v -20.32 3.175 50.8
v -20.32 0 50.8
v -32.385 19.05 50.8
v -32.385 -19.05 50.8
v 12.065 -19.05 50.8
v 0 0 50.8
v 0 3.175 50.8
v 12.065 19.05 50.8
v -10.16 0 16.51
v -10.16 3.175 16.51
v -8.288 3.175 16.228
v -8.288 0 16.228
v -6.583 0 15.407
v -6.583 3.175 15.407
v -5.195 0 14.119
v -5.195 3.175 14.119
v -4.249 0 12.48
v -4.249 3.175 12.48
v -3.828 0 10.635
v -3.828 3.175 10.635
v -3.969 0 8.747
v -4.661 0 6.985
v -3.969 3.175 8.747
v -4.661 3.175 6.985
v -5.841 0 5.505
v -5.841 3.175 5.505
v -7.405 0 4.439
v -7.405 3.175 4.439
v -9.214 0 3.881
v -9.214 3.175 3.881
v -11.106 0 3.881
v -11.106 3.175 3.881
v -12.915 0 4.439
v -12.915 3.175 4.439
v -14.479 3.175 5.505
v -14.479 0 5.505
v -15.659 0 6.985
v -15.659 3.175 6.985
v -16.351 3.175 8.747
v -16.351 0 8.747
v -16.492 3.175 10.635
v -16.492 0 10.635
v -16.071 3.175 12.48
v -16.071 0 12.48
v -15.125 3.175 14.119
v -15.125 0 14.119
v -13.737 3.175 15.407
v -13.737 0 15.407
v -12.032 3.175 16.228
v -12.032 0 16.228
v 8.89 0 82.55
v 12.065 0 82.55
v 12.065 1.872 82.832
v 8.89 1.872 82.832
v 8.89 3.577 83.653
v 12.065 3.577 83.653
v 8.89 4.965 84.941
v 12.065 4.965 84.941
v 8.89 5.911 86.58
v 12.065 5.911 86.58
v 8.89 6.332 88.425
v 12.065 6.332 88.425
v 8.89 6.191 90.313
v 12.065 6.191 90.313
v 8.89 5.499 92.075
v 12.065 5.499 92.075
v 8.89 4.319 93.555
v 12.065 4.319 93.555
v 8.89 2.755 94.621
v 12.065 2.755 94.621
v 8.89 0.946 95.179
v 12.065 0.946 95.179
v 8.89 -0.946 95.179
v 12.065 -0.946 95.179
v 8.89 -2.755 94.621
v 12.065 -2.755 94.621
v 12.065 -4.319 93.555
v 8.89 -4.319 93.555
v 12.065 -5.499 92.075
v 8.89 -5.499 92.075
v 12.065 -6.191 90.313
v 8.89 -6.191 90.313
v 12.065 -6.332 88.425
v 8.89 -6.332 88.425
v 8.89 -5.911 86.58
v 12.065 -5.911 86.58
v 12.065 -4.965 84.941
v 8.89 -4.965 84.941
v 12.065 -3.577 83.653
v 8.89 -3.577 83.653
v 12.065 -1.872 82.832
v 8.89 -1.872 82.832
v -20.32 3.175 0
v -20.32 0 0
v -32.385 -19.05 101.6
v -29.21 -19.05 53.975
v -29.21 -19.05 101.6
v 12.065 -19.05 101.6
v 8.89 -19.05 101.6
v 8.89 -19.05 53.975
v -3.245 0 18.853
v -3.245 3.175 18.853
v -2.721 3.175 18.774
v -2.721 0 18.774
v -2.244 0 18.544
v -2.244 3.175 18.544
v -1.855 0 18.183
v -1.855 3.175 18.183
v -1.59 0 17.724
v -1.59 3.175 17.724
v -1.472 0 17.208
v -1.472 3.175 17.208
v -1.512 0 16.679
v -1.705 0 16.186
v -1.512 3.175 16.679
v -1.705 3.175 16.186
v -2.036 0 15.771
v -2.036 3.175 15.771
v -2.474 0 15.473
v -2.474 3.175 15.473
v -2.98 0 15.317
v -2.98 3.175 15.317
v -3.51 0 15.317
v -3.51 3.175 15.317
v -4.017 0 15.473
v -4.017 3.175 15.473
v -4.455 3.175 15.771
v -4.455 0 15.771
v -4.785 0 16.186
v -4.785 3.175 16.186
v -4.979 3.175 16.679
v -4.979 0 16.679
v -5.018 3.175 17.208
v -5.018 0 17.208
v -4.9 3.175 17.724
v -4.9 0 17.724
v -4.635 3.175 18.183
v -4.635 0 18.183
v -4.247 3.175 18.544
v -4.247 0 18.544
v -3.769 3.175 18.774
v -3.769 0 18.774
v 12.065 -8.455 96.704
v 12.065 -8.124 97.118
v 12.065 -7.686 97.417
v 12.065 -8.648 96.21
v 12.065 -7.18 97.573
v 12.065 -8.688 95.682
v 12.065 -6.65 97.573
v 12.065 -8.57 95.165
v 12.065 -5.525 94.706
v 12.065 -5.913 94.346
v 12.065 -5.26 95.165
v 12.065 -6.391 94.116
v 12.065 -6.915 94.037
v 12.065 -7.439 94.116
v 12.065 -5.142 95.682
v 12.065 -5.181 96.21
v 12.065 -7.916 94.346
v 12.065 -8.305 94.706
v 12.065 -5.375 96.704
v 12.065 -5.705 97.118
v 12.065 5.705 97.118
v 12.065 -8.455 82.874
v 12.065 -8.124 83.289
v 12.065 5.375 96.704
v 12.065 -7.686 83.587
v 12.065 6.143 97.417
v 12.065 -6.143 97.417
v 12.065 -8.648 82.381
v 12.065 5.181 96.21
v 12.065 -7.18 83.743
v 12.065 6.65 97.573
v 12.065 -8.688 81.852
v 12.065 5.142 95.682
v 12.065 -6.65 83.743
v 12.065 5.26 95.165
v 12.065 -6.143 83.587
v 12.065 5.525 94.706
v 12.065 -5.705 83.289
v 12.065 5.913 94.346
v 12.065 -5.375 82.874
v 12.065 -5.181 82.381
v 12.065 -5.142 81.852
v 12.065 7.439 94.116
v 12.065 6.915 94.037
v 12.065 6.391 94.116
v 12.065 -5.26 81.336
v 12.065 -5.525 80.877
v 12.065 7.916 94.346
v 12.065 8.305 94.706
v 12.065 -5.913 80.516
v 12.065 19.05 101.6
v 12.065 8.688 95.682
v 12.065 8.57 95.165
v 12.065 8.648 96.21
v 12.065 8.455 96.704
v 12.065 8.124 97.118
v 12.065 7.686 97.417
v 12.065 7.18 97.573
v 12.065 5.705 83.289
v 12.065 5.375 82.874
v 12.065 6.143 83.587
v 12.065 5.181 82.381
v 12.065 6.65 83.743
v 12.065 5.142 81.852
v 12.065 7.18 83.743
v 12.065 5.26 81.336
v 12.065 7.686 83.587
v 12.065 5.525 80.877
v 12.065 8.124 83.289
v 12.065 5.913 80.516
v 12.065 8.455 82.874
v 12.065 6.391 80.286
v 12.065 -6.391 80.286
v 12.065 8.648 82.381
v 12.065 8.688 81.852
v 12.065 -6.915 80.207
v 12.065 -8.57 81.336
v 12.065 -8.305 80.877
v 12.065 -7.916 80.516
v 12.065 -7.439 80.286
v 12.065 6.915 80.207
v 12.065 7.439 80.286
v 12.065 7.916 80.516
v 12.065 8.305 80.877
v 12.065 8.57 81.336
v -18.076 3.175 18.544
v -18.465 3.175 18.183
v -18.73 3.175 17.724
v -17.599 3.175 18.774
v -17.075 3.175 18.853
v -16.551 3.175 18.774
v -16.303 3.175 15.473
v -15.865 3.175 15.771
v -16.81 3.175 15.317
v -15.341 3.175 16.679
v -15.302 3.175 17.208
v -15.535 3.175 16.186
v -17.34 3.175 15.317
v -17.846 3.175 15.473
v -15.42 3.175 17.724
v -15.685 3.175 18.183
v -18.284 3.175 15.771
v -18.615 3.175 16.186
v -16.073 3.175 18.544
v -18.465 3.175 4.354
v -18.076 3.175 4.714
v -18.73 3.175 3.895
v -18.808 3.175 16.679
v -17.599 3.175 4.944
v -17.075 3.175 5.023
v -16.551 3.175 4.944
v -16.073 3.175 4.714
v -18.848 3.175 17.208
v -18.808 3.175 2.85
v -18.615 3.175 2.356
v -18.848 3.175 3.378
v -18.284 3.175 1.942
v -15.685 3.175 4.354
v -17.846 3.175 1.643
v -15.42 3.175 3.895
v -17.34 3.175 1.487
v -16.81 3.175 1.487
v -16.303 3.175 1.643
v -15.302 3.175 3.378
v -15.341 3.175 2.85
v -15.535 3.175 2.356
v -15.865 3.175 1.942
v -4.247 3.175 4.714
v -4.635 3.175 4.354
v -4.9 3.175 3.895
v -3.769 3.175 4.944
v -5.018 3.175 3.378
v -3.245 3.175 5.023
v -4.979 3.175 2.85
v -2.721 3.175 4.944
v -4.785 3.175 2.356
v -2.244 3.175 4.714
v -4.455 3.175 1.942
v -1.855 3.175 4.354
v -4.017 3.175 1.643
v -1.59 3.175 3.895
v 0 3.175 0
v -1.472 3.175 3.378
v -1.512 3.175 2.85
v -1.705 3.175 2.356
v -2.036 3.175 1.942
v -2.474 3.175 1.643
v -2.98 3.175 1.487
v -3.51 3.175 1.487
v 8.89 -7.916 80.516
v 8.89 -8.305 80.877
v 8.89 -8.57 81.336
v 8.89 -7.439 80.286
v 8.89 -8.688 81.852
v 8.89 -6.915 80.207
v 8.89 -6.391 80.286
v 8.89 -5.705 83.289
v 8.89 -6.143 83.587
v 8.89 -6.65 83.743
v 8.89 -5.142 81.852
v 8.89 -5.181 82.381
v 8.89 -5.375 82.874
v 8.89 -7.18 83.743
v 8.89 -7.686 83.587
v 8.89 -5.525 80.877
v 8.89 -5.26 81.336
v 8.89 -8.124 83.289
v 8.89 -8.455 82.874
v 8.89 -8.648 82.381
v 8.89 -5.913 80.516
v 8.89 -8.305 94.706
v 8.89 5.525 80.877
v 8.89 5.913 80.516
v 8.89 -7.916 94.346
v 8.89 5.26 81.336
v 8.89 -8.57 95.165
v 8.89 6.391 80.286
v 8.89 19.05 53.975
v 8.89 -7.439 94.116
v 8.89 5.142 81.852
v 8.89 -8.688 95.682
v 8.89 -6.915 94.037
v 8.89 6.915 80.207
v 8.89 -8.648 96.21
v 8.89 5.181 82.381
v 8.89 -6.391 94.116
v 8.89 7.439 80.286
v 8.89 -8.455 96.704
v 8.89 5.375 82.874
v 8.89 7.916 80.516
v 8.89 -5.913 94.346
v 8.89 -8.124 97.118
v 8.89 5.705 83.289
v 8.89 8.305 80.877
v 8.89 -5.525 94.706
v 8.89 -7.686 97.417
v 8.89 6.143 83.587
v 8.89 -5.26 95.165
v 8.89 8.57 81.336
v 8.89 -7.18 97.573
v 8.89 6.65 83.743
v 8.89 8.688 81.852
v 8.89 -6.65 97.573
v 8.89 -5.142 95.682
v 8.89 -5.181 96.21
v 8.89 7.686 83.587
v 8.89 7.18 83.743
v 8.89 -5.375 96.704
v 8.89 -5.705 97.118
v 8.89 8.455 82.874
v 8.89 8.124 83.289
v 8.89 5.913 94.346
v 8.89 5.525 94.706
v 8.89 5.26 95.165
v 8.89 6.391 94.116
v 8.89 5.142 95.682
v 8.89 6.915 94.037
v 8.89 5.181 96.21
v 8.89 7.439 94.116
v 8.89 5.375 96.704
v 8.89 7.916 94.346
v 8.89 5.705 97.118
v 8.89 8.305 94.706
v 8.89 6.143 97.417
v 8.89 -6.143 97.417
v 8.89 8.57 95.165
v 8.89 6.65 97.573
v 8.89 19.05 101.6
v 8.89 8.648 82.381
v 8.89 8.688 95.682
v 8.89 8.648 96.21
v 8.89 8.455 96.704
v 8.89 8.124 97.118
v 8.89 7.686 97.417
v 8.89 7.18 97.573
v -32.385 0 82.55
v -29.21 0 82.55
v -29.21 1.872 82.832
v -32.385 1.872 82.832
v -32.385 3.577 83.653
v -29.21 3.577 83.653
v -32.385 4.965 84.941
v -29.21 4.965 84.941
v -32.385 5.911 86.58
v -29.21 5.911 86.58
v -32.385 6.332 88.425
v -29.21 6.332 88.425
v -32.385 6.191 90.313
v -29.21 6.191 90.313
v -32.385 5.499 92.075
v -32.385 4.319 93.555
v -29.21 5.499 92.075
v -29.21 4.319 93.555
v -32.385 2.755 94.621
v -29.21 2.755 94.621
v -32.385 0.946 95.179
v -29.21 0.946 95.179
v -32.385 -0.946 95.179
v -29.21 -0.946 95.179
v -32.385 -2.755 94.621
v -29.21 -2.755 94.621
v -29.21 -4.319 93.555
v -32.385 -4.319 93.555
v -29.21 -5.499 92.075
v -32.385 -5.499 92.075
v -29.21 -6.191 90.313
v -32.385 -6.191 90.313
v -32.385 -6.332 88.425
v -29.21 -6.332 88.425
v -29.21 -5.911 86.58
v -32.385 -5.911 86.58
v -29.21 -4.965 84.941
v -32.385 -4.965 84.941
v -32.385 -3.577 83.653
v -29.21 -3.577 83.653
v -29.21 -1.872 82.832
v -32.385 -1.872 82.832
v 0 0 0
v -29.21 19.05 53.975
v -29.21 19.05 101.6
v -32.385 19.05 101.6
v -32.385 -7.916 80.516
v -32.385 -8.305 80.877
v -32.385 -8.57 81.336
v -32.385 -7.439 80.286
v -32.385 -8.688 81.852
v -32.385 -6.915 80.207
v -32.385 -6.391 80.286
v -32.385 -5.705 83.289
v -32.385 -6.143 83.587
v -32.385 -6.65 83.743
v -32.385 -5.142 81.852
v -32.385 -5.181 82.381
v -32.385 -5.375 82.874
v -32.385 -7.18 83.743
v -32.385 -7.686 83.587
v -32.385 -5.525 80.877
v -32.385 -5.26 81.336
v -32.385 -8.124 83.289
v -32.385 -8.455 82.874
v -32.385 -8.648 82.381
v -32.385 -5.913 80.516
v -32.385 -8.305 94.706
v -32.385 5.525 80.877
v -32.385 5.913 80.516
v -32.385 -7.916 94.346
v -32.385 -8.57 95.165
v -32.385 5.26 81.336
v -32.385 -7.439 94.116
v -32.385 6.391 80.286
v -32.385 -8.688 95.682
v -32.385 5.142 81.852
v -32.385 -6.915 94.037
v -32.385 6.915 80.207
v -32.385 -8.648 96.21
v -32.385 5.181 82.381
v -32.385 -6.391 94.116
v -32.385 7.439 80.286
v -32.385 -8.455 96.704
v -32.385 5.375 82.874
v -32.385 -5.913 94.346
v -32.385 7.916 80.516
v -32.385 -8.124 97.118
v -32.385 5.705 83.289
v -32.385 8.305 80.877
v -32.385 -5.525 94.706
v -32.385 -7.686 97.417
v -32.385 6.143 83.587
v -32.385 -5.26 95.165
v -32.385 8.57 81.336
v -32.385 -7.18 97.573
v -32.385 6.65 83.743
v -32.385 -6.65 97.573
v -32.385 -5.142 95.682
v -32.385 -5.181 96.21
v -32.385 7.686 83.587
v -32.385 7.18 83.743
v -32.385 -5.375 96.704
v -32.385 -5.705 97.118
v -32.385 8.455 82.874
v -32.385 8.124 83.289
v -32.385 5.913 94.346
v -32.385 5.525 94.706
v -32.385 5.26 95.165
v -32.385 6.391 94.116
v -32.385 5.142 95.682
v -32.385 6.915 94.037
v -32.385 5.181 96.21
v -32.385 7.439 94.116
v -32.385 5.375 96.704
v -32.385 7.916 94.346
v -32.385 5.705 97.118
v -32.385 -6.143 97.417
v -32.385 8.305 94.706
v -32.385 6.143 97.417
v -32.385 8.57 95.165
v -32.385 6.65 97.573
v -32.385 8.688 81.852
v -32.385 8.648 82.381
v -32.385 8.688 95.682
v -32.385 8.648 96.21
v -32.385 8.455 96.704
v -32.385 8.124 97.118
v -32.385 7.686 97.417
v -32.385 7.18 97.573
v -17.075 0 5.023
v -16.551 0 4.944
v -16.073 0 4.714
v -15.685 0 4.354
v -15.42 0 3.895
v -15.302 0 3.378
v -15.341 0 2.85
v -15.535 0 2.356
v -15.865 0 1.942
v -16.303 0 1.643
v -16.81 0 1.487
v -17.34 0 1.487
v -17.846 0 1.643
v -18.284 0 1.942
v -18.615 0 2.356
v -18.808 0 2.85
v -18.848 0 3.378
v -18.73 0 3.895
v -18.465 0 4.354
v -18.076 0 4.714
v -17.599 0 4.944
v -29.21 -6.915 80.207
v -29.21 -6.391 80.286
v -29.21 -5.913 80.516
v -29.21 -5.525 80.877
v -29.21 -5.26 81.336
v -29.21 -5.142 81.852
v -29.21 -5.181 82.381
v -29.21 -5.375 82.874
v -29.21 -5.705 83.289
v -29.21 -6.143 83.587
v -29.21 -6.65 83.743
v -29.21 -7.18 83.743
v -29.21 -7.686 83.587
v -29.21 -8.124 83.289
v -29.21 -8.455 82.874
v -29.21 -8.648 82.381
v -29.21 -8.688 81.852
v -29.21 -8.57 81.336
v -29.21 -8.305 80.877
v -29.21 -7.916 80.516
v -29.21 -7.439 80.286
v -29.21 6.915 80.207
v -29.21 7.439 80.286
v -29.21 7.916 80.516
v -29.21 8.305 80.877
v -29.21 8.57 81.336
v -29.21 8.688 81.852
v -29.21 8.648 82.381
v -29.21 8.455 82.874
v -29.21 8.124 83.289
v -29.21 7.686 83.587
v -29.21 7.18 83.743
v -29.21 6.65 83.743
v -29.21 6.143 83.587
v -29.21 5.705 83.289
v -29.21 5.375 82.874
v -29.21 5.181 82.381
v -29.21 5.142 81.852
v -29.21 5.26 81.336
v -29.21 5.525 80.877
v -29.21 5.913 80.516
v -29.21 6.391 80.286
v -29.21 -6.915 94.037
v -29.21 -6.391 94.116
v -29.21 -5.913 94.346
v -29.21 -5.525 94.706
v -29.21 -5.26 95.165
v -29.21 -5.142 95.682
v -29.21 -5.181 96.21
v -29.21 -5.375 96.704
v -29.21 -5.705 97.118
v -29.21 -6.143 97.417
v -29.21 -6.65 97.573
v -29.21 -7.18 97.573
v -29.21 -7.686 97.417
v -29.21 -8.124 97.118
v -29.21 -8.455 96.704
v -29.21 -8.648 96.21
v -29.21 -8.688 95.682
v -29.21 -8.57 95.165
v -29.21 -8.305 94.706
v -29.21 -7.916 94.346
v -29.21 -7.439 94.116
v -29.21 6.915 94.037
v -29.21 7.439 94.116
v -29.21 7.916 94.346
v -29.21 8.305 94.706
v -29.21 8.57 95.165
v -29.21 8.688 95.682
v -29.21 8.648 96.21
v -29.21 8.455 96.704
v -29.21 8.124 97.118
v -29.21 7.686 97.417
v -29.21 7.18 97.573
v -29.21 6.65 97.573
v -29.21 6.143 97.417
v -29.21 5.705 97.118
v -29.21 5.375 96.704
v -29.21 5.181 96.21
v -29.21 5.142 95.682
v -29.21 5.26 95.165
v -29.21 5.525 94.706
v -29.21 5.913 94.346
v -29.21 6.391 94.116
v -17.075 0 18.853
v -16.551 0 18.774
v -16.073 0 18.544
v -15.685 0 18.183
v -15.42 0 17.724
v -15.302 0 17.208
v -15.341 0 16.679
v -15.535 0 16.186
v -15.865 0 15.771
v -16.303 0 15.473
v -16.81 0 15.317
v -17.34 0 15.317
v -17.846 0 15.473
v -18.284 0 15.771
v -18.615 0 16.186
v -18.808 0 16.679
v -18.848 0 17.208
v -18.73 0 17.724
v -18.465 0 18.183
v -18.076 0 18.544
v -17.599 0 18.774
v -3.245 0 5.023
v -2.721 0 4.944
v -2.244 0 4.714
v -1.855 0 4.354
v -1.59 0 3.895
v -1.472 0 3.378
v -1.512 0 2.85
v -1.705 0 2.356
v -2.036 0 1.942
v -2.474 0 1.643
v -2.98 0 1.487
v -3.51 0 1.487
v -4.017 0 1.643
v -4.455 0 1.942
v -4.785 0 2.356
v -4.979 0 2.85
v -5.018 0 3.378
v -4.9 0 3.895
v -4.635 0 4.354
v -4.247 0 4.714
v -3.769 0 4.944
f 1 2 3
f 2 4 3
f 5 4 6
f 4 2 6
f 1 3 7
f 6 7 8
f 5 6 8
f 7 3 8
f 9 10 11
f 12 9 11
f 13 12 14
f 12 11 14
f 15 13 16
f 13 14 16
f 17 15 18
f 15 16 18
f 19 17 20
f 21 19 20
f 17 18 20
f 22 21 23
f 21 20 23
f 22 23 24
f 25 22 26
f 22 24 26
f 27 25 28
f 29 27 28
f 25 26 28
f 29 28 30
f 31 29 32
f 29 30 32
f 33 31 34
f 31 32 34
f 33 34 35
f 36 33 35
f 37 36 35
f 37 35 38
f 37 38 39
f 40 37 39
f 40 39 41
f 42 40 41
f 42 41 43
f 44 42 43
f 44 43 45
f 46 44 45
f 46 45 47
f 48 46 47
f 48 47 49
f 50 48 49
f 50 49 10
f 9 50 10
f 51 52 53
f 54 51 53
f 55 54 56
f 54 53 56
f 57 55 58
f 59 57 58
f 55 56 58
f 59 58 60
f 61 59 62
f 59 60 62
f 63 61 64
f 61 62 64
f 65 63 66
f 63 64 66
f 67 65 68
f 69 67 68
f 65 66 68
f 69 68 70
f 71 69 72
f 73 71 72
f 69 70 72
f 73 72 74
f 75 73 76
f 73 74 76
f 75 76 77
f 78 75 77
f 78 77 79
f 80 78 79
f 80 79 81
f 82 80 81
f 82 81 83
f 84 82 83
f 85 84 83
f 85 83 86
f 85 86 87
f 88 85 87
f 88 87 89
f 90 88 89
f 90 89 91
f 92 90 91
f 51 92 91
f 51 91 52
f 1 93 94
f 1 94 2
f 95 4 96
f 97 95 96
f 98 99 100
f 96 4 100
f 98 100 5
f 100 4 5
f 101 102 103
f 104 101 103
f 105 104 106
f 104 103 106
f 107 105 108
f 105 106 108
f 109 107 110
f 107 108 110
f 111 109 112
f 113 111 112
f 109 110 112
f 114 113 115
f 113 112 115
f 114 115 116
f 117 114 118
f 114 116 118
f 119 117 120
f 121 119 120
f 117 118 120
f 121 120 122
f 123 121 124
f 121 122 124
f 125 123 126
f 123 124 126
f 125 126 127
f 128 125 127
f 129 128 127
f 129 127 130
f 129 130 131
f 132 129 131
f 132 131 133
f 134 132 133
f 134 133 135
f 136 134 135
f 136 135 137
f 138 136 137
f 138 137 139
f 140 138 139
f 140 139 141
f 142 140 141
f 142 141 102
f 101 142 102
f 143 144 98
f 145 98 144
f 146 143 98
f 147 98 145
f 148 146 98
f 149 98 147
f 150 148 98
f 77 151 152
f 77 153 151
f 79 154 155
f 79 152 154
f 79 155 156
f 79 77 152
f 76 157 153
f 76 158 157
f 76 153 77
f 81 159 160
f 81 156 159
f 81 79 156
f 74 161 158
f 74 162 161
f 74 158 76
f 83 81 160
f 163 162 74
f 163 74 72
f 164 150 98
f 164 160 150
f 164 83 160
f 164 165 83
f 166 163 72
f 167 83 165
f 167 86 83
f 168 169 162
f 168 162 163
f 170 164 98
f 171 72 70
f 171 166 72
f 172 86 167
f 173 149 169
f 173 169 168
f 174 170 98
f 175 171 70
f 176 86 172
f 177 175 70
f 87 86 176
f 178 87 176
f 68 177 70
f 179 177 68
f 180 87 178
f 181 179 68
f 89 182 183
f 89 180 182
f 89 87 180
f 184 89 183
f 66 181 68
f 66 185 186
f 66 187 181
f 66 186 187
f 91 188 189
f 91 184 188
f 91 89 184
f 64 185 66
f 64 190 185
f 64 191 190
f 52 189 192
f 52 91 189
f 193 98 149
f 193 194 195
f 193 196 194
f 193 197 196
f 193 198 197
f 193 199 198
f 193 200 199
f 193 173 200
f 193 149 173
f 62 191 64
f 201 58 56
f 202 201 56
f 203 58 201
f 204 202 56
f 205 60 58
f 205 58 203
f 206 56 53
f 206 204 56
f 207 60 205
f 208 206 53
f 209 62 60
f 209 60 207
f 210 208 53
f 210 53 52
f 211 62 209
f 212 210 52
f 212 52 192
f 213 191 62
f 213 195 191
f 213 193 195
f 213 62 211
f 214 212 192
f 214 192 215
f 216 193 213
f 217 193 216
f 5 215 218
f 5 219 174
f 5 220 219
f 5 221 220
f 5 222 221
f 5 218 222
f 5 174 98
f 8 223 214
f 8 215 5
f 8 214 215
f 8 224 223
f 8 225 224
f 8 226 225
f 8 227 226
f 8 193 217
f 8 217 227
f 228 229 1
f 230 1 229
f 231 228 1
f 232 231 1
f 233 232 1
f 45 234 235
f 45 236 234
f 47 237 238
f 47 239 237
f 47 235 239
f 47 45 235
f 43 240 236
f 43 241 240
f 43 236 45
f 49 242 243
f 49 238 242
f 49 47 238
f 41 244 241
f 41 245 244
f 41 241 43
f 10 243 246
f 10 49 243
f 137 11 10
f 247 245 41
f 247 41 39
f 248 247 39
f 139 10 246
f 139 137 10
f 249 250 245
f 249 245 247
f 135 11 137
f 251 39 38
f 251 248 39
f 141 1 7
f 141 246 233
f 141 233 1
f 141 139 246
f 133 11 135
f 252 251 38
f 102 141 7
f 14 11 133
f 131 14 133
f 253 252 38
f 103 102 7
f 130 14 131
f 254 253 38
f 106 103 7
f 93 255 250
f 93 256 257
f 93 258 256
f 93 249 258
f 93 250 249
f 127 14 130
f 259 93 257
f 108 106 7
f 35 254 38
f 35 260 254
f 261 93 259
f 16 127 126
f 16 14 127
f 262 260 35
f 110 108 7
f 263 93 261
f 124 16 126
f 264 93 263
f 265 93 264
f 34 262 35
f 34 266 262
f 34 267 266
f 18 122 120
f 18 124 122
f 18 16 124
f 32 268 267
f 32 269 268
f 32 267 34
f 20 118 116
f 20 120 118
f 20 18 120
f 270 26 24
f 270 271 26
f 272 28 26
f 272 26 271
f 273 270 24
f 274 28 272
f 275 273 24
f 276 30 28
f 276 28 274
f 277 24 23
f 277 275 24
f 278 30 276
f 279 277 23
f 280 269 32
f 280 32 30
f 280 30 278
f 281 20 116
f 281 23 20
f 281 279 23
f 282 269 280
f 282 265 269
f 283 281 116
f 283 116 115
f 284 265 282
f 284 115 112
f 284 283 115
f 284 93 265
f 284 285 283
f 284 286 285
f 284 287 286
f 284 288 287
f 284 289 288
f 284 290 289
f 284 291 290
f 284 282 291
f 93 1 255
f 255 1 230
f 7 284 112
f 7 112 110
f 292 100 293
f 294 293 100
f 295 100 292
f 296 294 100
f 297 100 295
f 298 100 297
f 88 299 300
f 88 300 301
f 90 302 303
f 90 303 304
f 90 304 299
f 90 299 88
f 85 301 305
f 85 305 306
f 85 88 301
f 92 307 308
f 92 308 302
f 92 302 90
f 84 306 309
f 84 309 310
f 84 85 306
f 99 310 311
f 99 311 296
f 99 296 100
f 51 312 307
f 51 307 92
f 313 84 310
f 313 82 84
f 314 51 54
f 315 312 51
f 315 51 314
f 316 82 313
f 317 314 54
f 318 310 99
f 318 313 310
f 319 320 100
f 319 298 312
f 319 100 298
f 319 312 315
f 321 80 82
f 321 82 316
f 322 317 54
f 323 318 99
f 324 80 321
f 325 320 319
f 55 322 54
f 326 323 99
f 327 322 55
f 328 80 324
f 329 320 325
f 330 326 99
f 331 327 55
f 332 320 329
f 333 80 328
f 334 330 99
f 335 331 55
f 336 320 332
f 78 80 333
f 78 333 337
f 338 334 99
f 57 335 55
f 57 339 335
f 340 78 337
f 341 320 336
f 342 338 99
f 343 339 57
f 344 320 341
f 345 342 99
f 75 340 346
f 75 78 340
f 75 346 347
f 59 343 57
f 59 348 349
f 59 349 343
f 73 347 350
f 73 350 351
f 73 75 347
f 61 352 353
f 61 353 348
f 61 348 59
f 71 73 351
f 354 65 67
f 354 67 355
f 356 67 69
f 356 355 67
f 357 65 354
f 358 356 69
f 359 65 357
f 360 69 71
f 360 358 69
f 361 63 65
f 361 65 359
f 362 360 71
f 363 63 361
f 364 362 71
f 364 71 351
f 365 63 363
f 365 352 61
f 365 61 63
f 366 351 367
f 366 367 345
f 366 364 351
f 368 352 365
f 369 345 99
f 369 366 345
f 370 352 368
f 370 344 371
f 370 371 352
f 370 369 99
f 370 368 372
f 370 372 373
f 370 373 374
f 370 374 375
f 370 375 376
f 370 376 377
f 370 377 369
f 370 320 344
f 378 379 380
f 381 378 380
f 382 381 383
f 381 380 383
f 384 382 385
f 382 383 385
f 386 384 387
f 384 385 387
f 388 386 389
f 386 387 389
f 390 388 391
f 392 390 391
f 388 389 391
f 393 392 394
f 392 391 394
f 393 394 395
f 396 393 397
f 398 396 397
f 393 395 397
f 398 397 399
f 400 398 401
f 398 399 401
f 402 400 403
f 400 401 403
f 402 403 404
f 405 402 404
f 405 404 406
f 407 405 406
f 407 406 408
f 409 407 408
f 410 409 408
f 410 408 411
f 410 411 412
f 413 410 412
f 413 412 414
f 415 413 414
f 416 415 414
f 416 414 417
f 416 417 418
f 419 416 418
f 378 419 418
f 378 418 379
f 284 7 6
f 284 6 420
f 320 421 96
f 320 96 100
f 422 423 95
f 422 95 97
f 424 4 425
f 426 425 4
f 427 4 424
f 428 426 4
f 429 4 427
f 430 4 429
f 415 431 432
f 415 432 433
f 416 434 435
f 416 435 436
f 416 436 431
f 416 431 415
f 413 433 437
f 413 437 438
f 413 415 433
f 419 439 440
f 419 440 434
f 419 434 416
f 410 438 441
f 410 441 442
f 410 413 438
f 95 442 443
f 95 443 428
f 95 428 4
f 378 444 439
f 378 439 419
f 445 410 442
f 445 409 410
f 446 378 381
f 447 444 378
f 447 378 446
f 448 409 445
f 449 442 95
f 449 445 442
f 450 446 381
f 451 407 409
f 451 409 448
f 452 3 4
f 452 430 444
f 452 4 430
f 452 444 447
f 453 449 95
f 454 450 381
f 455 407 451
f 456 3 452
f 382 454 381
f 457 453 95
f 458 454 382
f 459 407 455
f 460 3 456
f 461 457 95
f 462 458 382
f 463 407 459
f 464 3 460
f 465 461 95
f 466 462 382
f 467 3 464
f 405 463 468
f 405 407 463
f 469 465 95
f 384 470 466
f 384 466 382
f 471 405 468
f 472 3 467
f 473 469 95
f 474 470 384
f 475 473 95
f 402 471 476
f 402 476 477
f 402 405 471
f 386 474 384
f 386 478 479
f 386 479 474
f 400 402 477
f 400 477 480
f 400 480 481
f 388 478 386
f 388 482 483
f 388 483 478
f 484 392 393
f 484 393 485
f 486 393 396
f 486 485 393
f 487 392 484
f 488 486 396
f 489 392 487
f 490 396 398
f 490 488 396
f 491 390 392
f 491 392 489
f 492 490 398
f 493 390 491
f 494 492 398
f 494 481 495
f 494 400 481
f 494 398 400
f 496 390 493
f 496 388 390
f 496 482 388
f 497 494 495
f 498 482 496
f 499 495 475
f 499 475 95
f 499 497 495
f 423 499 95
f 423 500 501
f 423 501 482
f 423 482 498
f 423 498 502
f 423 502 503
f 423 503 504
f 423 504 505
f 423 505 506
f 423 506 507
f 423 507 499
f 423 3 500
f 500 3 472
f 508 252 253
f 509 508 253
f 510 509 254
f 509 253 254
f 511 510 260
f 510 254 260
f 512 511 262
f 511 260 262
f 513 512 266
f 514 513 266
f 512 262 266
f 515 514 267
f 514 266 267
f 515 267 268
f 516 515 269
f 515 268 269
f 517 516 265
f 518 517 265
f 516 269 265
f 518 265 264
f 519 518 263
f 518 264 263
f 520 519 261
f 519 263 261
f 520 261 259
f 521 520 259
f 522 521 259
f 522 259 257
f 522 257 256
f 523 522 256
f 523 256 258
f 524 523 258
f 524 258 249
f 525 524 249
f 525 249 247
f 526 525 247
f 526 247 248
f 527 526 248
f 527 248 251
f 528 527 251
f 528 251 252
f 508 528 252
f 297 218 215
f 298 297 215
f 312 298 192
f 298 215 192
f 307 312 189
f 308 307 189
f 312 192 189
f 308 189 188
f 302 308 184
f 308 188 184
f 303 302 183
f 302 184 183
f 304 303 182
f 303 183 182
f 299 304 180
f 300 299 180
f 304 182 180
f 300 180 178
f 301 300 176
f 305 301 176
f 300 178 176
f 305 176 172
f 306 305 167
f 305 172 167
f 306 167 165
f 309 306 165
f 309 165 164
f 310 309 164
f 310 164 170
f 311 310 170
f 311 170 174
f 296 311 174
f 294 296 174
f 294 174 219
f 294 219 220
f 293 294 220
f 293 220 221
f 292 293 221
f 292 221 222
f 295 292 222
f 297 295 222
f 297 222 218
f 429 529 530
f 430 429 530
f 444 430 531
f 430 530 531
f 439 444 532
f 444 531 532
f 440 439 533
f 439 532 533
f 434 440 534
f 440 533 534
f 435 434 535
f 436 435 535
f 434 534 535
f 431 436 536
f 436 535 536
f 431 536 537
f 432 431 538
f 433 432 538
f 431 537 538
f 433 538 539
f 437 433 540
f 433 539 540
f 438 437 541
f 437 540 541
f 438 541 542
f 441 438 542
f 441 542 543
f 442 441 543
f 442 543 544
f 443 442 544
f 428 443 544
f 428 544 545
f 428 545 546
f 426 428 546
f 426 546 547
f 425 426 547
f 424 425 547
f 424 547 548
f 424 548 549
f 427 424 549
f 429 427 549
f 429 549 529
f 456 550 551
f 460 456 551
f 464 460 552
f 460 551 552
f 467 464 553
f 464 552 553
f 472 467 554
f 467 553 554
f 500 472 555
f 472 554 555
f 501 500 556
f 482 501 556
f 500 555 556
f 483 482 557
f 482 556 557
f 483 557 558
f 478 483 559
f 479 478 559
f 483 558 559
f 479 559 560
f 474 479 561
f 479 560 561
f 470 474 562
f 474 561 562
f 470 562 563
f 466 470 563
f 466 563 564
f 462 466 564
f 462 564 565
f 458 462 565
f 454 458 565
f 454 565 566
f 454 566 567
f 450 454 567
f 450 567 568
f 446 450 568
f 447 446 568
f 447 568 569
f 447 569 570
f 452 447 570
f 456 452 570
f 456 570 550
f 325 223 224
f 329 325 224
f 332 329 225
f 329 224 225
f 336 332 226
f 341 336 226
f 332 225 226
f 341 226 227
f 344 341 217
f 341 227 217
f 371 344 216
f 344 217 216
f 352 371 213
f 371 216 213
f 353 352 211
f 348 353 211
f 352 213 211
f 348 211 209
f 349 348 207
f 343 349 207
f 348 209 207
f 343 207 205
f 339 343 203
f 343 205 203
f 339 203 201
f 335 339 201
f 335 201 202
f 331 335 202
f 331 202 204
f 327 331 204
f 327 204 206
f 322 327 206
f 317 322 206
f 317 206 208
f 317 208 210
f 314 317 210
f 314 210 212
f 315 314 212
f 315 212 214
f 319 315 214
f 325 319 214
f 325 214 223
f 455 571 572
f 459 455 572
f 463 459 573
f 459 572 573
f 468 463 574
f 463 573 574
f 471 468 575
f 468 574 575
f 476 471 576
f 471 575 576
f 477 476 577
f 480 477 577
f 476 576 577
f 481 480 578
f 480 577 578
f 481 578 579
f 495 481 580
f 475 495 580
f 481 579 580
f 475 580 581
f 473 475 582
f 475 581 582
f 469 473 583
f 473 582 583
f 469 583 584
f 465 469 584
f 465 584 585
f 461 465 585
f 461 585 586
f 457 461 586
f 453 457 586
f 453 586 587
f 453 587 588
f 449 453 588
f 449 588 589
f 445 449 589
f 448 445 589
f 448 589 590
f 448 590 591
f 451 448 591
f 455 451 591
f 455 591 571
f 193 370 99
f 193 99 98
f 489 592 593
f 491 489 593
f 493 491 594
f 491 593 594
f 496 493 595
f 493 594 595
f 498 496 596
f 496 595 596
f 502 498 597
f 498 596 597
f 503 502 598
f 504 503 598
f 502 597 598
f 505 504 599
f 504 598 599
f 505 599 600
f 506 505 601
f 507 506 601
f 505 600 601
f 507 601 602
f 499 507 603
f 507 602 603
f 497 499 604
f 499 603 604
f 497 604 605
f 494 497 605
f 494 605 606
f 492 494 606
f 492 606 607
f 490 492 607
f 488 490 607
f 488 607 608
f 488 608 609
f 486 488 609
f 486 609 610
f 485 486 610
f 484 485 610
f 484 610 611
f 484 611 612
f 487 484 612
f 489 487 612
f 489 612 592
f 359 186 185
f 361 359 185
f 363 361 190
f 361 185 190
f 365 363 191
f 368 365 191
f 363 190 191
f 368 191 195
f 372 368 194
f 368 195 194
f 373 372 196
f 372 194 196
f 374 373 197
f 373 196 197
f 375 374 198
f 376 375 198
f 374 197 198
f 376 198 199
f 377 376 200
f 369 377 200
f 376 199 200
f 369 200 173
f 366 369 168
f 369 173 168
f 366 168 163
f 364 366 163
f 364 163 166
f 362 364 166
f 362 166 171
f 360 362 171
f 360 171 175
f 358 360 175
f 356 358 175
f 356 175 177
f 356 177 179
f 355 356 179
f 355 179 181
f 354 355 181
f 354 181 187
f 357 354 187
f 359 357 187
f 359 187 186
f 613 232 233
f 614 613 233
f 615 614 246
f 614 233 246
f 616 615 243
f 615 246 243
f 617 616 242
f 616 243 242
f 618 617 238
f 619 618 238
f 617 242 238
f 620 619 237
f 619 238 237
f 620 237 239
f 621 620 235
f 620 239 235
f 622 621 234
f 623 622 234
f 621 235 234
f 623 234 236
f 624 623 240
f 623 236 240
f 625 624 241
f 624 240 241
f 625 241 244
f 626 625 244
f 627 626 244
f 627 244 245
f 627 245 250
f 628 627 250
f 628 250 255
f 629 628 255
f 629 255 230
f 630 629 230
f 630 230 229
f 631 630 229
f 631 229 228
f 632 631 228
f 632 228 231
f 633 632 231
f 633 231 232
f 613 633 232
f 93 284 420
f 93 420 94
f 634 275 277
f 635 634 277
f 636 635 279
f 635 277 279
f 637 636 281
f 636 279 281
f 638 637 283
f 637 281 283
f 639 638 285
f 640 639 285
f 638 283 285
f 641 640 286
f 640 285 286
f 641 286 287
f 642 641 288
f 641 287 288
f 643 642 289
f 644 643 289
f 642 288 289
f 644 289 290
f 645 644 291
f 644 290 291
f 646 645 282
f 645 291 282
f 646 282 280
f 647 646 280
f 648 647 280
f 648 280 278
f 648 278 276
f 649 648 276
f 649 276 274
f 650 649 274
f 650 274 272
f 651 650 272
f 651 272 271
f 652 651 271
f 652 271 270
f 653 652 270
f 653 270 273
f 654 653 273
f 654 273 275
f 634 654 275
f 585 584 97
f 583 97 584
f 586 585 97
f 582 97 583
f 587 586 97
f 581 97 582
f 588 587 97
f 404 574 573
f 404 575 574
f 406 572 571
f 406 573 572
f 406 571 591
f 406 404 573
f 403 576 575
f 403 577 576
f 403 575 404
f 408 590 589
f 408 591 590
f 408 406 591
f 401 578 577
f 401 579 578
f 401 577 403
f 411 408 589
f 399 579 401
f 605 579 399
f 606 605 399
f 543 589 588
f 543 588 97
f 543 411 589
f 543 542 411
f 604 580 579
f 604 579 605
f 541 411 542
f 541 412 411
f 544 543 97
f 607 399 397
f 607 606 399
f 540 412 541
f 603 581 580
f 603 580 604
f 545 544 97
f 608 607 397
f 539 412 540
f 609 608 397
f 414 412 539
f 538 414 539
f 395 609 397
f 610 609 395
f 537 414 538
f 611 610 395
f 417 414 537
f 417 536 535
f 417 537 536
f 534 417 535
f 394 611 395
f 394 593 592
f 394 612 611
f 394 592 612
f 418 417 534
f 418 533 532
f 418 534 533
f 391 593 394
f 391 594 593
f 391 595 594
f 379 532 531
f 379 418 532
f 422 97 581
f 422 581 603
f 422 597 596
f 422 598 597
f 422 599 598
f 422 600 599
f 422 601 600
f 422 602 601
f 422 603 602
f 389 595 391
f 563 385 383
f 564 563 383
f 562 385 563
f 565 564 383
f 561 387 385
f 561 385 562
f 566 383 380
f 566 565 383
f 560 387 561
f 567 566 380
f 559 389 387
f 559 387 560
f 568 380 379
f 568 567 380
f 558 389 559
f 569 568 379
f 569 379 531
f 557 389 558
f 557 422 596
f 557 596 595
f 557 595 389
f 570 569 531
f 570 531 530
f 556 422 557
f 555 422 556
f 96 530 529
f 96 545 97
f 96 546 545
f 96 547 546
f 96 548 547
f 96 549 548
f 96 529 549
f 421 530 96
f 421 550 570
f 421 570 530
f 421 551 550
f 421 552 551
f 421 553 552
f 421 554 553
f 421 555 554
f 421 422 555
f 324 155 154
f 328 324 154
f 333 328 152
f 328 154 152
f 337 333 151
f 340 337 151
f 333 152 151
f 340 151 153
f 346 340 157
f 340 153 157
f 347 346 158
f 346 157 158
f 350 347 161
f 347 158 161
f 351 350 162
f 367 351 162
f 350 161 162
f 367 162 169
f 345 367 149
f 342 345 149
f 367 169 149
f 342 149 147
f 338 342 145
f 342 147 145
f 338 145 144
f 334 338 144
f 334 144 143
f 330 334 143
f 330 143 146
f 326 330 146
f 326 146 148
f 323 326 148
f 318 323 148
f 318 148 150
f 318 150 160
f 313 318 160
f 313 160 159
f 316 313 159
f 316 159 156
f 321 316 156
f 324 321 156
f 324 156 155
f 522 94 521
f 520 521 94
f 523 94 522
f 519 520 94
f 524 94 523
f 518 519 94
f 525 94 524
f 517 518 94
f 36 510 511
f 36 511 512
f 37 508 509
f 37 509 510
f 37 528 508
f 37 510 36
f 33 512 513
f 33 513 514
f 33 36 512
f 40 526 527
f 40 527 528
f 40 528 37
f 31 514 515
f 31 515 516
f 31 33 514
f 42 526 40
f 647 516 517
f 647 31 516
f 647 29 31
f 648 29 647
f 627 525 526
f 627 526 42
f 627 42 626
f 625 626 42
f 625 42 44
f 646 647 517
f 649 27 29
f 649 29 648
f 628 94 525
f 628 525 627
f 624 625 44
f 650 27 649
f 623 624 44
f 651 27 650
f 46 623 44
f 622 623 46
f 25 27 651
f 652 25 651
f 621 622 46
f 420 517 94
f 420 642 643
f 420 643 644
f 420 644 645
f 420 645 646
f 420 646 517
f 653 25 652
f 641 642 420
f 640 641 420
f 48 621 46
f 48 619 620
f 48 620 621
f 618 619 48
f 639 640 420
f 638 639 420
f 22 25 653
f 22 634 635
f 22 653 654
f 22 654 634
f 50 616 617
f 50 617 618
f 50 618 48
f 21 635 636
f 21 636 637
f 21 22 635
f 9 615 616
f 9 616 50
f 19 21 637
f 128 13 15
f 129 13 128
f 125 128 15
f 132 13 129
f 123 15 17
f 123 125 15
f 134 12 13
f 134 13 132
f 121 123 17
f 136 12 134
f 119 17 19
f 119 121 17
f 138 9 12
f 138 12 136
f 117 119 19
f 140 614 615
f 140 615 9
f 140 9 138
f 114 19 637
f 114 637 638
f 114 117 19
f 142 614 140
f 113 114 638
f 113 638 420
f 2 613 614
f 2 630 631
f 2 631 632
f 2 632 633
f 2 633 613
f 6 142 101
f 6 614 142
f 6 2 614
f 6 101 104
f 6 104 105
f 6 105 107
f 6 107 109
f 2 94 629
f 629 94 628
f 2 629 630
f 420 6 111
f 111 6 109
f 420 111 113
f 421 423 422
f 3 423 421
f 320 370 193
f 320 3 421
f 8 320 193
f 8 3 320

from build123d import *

# Parameters (mm, degrees)
BOSS_EXTRUDE1_DEPTH = 19.05
SKETCH3_W           = 20.32
SKETCH3_H           = 50.8
CUT_EXTRUDE1_DEPTH  = 19.05
SKETCH4_W           = 20.32
SKETCH4_H           = 50.8
CUT_EXTRUDE2_DEPTH  = 15.875
CUT_EXTRUDE3_REACH  = 110.928
SKETCH6_R           = 6.35
SKETCH6_R_2         = 1.778
CUT_EXTRUDE6_REACH  = 114.522
SKETCH9_R           = 6.35
SKETCH9_R_2         = 1.778


with BuildPart() as part:
    # Sketch1 → Boss-Extrude1 (new, symmetric)
    with BuildSketch(Plane(origin=(0, 0, 0), x_dir=(1, 0, 0), z_dir=(0, 1, 0))):
        Polygon((0, 0), (-20.32, 0), (-20.32, -50.8), (-32.385, -50.8), (-32.385, -101.6), (-29.21, -101.6), (-29.21, -53.975), (8.89, -53.975), (8.89, -101.6), (12.065, -101.6), (12.065, -50.8), (0, -50.8), align=None)
    extrude(amount=BOSS_EXTRUDE1_DEPTH, both=True)

    # Sketch3 → Cut-Extrude1 (cut)
    with BuildSketch(Plane.XZ.offset(19.05)):
        with Locations((-10.16, 25.4)):
            Rectangle(SKETCH3_W, SKETCH3_H)
    extrude(amount=-CUT_EXTRUDE1_DEPTH, mode=Mode.SUBTRACT)

    # Sketch4 → Cut-Extrude2 (cut)
    with BuildSketch(Plane(origin=(0, 19.05, 0), x_dir=(1, 0, 0), z_dir=(0, 1, 0))):
        with Locations((-10.16, -25.4)):
            Rectangle(SKETCH4_W, SKETCH4_H)
    extrude(amount=-CUT_EXTRUDE2_DEPTH, mode=Mode.SUBTRACT)

    # Sketch6 → Cut-Extrude3 (cut, up to next)
    with BuildSketch(Plane(origin=(0, 3.175, 0), x_dir=(1, 0, 0), z_dir=(0, 1, 0)), mode=Mode.PRIVATE) as cut_extrude3_sk1:
        with Locations(Location((-10.16, -10.16, 0), (0, 0, 270))):
            Circle(SKETCH6_R)
    cut_extrude3_tool1 = extrude(cut_extrude3_sk1.sketch, amount=-CUT_EXTRUDE3_REACH, mode=Mode.PRIVATE) & part.part
    # Sketch6 → Cut-Extrude3 (cut, up to next)
    with BuildSketch(Plane(origin=(0, 3.175, 0), x_dir=(1, 0, 0), z_dir=(0, 1, 0)), mode=Mode.PRIVATE) as cut_extrude3_sk2:
        with Locations(Location((-17.074797213, -17.074797213, 0), (0, 0, 270))):
            Circle(SKETCH6_R_2)
    cut_extrude3_tool2 = extrude(cut_extrude3_sk2.sketch, amount=-CUT_EXTRUDE3_REACH, mode=Mode.PRIVATE) & part.part
    # Sketch6 → Cut-Extrude3 (cut, up to next)
    with BuildSketch(Plane(origin=(0, 3.175, 0), x_dir=(1, 0, 0), z_dir=(0, 1, 0)), mode=Mode.PRIVATE) as cut_extrude3_sk3:
        with Locations(Location((-17.074797213, -3.245202787, 0), (0, 0, 270))):
            Circle(SKETCH6_R_2)
    cut_extrude3_tool3 = extrude(cut_extrude3_sk3.sketch, amount=-CUT_EXTRUDE3_REACH, mode=Mode.PRIVATE) & part.part
    # Sketch6 → Cut-Extrude3 (cut, up to next)
    with BuildSketch(Plane(origin=(0, 3.175, 0), x_dir=(1, 0, 0), z_dir=(0, 1, 0)), mode=Mode.PRIVATE) as cut_extrude3_sk4:
        with Locations(Location((-3.245202787, -3.245202787, 0), (0, 0, 270))):
            Circle(SKETCH6_R_2)
    cut_extrude3_tool4 = extrude(cut_extrude3_sk4.sketch, amount=-CUT_EXTRUDE3_REACH, mode=Mode.PRIVATE) & part.part
    # Sketch6 → Cut-Extrude3 (cut, up to next)
    with BuildSketch(Plane(origin=(0, 3.175, 0), x_dir=(1, 0, 0), z_dir=(0, 1, 0)), mode=Mode.PRIVATE) as cut_extrude3_sk5:
        with Locations(Location((-3.245202787, -17.074797213, 0), (0, 0, 270))):
            Circle(SKETCH6_R_2)
    cut_extrude3_tool5 = extrude(cut_extrude3_sk5.sketch, amount=-CUT_EXTRUDE3_REACH, mode=Mode.PRIVATE) & part.part
    add(cut_extrude3_tool1.solids().sort_by_distance((-10.16, 3.175, 10.16))[0], mode=Mode.SUBTRACT)
    add(cut_extrude3_tool2.solids().sort_by_distance((-17.074797, 3.175, 17.074797))[0], mode=Mode.SUBTRACT)
    add(cut_extrude3_tool3.solids().sort_by_distance((-17.074797, 3.175, 3.245203))[0], mode=Mode.SUBTRACT)
    add(cut_extrude3_tool4.solids().sort_by_distance((-3.245203, 3.175, 3.245203))[0], mode=Mode.SUBTRACT)
    add(cut_extrude3_tool5.solids().sort_by_distance((-3.245203, 3.175, 17.074797))[0], mode=Mode.SUBTRACT)

    # Cut-Extrude6: up to this face of the body (flat: up to its plane)
    cut_extrude6_end = Plane(part.part.faces().sort_by_distance((-32.385, 0, 76.2))[0])
    # Sketch9 → Cut-Extrude6 (cut, up to the picked face)
    with BuildSketch(Plane(origin=(12.065, 0, 0), x_dir=(0, 0, -1), z_dir=(1, 0, 0)), mode=Mode.PRIVATE) as cut_extrude6_sk1:
        with Locations((-88.9, 0)):
            Circle(SKETCH9_R)
    cut_extrude6_tool1 = split(extrude(cut_extrude6_sk1.sketch, amount=-CUT_EXTRUDE6_REACH, mode=Mode.PRIVATE), bisect_by=cut_extrude6_end, keep=Keep.BOTH, mode=Mode.PRIVATE)
    # Sketch9 → Cut-Extrude6 (cut, up to the picked face)
    with BuildSketch(Plane(origin=(12.065, 0, 0), x_dir=(0, 0, -1), z_dir=(1, 0, 0)), mode=Mode.PRIVATE) as cut_extrude6_sk2:
        with Locations((-95.814797213, 6.914797213)):
            Circle(SKETCH9_R_2)
    cut_extrude6_tool2 = split(extrude(cut_extrude6_sk2.sketch, amount=-CUT_EXTRUDE6_REACH, mode=Mode.PRIVATE), bisect_by=cut_extrude6_end, keep=Keep.BOTH, mode=Mode.PRIVATE)
    # Sketch9 → Cut-Extrude6 (cut, up to the picked face)
    with BuildSketch(Plane(origin=(12.065, 0, 0), x_dir=(0, 0, -1), z_dir=(1, 0, 0)), mode=Mode.PRIVATE) as cut_extrude6_sk3:
        with Locations((-81.985202787, 6.914797213)):
            Circle(SKETCH9_R_2)
    cut_extrude6_tool3 = split(extrude(cut_extrude6_sk3.sketch, amount=-CUT_EXTRUDE6_REACH, mode=Mode.PRIVATE), bisect_by=cut_extrude6_end, keep=Keep.BOTH, mode=Mode.PRIVATE)
    # Sketch9 → Cut-Extrude6 (cut, up to the picked face)
    with BuildSketch(Plane(origin=(12.065, 0, 0), x_dir=(0, 0, -1), z_dir=(1, 0, 0)), mode=Mode.PRIVATE) as cut_extrude6_sk4:
        with Locations((-81.985202787, -6.914797213)):
            Circle(SKETCH9_R_2)
    cut_extrude6_tool4 = split(extrude(cut_extrude6_sk4.sketch, amount=-CUT_EXTRUDE6_REACH, mode=Mode.PRIVATE), bisect_by=cut_extrude6_end, keep=Keep.BOTH, mode=Mode.PRIVATE)
    # Sketch9 → Cut-Extrude6 (cut, up to the picked face)
    with BuildSketch(Plane(origin=(12.065, 0, 0), x_dir=(0, 0, -1), z_dir=(1, 0, 0)), mode=Mode.PRIVATE) as cut_extrude6_sk5:
        with Locations((-95.814797213, -6.914797213)):
            Circle(SKETCH9_R_2)
    cut_extrude6_tool5 = split(extrude(cut_extrude6_sk5.sketch, amount=-CUT_EXTRUDE6_REACH, mode=Mode.PRIVATE), bisect_by=cut_extrude6_end, keep=Keep.BOTH, mode=Mode.PRIVATE)
    add(cut_extrude6_tool1.solids().sort_by(Axis((12.065, 0, 88.9), (-1, 0, 0)))[0], mode=Mode.SUBTRACT)
    add(cut_extrude6_tool2.solids().sort_by(Axis((12.065, 6.914797, 95.814797), (-1, 0, 0)))[0], mode=Mode.SUBTRACT)
    add(cut_extrude6_tool3.solids().sort_by(Axis((12.065, 6.914797, 81.985203), (-1, 0, 0)))[0], mode=Mode.SUBTRACT)
    add(cut_extrude6_tool4.solids().sort_by(Axis((12.065, -6.914797, 81.985203), (-1, 0, 0)))[0], mode=Mode.SUBTRACT)
    add(cut_extrude6_tool5.solids().sort_by(Axis((12.065, -6.914797, 95.814797), (-1, 0, 0)))[0], mode=Mode.SUBTRACT)


solid = part.part
